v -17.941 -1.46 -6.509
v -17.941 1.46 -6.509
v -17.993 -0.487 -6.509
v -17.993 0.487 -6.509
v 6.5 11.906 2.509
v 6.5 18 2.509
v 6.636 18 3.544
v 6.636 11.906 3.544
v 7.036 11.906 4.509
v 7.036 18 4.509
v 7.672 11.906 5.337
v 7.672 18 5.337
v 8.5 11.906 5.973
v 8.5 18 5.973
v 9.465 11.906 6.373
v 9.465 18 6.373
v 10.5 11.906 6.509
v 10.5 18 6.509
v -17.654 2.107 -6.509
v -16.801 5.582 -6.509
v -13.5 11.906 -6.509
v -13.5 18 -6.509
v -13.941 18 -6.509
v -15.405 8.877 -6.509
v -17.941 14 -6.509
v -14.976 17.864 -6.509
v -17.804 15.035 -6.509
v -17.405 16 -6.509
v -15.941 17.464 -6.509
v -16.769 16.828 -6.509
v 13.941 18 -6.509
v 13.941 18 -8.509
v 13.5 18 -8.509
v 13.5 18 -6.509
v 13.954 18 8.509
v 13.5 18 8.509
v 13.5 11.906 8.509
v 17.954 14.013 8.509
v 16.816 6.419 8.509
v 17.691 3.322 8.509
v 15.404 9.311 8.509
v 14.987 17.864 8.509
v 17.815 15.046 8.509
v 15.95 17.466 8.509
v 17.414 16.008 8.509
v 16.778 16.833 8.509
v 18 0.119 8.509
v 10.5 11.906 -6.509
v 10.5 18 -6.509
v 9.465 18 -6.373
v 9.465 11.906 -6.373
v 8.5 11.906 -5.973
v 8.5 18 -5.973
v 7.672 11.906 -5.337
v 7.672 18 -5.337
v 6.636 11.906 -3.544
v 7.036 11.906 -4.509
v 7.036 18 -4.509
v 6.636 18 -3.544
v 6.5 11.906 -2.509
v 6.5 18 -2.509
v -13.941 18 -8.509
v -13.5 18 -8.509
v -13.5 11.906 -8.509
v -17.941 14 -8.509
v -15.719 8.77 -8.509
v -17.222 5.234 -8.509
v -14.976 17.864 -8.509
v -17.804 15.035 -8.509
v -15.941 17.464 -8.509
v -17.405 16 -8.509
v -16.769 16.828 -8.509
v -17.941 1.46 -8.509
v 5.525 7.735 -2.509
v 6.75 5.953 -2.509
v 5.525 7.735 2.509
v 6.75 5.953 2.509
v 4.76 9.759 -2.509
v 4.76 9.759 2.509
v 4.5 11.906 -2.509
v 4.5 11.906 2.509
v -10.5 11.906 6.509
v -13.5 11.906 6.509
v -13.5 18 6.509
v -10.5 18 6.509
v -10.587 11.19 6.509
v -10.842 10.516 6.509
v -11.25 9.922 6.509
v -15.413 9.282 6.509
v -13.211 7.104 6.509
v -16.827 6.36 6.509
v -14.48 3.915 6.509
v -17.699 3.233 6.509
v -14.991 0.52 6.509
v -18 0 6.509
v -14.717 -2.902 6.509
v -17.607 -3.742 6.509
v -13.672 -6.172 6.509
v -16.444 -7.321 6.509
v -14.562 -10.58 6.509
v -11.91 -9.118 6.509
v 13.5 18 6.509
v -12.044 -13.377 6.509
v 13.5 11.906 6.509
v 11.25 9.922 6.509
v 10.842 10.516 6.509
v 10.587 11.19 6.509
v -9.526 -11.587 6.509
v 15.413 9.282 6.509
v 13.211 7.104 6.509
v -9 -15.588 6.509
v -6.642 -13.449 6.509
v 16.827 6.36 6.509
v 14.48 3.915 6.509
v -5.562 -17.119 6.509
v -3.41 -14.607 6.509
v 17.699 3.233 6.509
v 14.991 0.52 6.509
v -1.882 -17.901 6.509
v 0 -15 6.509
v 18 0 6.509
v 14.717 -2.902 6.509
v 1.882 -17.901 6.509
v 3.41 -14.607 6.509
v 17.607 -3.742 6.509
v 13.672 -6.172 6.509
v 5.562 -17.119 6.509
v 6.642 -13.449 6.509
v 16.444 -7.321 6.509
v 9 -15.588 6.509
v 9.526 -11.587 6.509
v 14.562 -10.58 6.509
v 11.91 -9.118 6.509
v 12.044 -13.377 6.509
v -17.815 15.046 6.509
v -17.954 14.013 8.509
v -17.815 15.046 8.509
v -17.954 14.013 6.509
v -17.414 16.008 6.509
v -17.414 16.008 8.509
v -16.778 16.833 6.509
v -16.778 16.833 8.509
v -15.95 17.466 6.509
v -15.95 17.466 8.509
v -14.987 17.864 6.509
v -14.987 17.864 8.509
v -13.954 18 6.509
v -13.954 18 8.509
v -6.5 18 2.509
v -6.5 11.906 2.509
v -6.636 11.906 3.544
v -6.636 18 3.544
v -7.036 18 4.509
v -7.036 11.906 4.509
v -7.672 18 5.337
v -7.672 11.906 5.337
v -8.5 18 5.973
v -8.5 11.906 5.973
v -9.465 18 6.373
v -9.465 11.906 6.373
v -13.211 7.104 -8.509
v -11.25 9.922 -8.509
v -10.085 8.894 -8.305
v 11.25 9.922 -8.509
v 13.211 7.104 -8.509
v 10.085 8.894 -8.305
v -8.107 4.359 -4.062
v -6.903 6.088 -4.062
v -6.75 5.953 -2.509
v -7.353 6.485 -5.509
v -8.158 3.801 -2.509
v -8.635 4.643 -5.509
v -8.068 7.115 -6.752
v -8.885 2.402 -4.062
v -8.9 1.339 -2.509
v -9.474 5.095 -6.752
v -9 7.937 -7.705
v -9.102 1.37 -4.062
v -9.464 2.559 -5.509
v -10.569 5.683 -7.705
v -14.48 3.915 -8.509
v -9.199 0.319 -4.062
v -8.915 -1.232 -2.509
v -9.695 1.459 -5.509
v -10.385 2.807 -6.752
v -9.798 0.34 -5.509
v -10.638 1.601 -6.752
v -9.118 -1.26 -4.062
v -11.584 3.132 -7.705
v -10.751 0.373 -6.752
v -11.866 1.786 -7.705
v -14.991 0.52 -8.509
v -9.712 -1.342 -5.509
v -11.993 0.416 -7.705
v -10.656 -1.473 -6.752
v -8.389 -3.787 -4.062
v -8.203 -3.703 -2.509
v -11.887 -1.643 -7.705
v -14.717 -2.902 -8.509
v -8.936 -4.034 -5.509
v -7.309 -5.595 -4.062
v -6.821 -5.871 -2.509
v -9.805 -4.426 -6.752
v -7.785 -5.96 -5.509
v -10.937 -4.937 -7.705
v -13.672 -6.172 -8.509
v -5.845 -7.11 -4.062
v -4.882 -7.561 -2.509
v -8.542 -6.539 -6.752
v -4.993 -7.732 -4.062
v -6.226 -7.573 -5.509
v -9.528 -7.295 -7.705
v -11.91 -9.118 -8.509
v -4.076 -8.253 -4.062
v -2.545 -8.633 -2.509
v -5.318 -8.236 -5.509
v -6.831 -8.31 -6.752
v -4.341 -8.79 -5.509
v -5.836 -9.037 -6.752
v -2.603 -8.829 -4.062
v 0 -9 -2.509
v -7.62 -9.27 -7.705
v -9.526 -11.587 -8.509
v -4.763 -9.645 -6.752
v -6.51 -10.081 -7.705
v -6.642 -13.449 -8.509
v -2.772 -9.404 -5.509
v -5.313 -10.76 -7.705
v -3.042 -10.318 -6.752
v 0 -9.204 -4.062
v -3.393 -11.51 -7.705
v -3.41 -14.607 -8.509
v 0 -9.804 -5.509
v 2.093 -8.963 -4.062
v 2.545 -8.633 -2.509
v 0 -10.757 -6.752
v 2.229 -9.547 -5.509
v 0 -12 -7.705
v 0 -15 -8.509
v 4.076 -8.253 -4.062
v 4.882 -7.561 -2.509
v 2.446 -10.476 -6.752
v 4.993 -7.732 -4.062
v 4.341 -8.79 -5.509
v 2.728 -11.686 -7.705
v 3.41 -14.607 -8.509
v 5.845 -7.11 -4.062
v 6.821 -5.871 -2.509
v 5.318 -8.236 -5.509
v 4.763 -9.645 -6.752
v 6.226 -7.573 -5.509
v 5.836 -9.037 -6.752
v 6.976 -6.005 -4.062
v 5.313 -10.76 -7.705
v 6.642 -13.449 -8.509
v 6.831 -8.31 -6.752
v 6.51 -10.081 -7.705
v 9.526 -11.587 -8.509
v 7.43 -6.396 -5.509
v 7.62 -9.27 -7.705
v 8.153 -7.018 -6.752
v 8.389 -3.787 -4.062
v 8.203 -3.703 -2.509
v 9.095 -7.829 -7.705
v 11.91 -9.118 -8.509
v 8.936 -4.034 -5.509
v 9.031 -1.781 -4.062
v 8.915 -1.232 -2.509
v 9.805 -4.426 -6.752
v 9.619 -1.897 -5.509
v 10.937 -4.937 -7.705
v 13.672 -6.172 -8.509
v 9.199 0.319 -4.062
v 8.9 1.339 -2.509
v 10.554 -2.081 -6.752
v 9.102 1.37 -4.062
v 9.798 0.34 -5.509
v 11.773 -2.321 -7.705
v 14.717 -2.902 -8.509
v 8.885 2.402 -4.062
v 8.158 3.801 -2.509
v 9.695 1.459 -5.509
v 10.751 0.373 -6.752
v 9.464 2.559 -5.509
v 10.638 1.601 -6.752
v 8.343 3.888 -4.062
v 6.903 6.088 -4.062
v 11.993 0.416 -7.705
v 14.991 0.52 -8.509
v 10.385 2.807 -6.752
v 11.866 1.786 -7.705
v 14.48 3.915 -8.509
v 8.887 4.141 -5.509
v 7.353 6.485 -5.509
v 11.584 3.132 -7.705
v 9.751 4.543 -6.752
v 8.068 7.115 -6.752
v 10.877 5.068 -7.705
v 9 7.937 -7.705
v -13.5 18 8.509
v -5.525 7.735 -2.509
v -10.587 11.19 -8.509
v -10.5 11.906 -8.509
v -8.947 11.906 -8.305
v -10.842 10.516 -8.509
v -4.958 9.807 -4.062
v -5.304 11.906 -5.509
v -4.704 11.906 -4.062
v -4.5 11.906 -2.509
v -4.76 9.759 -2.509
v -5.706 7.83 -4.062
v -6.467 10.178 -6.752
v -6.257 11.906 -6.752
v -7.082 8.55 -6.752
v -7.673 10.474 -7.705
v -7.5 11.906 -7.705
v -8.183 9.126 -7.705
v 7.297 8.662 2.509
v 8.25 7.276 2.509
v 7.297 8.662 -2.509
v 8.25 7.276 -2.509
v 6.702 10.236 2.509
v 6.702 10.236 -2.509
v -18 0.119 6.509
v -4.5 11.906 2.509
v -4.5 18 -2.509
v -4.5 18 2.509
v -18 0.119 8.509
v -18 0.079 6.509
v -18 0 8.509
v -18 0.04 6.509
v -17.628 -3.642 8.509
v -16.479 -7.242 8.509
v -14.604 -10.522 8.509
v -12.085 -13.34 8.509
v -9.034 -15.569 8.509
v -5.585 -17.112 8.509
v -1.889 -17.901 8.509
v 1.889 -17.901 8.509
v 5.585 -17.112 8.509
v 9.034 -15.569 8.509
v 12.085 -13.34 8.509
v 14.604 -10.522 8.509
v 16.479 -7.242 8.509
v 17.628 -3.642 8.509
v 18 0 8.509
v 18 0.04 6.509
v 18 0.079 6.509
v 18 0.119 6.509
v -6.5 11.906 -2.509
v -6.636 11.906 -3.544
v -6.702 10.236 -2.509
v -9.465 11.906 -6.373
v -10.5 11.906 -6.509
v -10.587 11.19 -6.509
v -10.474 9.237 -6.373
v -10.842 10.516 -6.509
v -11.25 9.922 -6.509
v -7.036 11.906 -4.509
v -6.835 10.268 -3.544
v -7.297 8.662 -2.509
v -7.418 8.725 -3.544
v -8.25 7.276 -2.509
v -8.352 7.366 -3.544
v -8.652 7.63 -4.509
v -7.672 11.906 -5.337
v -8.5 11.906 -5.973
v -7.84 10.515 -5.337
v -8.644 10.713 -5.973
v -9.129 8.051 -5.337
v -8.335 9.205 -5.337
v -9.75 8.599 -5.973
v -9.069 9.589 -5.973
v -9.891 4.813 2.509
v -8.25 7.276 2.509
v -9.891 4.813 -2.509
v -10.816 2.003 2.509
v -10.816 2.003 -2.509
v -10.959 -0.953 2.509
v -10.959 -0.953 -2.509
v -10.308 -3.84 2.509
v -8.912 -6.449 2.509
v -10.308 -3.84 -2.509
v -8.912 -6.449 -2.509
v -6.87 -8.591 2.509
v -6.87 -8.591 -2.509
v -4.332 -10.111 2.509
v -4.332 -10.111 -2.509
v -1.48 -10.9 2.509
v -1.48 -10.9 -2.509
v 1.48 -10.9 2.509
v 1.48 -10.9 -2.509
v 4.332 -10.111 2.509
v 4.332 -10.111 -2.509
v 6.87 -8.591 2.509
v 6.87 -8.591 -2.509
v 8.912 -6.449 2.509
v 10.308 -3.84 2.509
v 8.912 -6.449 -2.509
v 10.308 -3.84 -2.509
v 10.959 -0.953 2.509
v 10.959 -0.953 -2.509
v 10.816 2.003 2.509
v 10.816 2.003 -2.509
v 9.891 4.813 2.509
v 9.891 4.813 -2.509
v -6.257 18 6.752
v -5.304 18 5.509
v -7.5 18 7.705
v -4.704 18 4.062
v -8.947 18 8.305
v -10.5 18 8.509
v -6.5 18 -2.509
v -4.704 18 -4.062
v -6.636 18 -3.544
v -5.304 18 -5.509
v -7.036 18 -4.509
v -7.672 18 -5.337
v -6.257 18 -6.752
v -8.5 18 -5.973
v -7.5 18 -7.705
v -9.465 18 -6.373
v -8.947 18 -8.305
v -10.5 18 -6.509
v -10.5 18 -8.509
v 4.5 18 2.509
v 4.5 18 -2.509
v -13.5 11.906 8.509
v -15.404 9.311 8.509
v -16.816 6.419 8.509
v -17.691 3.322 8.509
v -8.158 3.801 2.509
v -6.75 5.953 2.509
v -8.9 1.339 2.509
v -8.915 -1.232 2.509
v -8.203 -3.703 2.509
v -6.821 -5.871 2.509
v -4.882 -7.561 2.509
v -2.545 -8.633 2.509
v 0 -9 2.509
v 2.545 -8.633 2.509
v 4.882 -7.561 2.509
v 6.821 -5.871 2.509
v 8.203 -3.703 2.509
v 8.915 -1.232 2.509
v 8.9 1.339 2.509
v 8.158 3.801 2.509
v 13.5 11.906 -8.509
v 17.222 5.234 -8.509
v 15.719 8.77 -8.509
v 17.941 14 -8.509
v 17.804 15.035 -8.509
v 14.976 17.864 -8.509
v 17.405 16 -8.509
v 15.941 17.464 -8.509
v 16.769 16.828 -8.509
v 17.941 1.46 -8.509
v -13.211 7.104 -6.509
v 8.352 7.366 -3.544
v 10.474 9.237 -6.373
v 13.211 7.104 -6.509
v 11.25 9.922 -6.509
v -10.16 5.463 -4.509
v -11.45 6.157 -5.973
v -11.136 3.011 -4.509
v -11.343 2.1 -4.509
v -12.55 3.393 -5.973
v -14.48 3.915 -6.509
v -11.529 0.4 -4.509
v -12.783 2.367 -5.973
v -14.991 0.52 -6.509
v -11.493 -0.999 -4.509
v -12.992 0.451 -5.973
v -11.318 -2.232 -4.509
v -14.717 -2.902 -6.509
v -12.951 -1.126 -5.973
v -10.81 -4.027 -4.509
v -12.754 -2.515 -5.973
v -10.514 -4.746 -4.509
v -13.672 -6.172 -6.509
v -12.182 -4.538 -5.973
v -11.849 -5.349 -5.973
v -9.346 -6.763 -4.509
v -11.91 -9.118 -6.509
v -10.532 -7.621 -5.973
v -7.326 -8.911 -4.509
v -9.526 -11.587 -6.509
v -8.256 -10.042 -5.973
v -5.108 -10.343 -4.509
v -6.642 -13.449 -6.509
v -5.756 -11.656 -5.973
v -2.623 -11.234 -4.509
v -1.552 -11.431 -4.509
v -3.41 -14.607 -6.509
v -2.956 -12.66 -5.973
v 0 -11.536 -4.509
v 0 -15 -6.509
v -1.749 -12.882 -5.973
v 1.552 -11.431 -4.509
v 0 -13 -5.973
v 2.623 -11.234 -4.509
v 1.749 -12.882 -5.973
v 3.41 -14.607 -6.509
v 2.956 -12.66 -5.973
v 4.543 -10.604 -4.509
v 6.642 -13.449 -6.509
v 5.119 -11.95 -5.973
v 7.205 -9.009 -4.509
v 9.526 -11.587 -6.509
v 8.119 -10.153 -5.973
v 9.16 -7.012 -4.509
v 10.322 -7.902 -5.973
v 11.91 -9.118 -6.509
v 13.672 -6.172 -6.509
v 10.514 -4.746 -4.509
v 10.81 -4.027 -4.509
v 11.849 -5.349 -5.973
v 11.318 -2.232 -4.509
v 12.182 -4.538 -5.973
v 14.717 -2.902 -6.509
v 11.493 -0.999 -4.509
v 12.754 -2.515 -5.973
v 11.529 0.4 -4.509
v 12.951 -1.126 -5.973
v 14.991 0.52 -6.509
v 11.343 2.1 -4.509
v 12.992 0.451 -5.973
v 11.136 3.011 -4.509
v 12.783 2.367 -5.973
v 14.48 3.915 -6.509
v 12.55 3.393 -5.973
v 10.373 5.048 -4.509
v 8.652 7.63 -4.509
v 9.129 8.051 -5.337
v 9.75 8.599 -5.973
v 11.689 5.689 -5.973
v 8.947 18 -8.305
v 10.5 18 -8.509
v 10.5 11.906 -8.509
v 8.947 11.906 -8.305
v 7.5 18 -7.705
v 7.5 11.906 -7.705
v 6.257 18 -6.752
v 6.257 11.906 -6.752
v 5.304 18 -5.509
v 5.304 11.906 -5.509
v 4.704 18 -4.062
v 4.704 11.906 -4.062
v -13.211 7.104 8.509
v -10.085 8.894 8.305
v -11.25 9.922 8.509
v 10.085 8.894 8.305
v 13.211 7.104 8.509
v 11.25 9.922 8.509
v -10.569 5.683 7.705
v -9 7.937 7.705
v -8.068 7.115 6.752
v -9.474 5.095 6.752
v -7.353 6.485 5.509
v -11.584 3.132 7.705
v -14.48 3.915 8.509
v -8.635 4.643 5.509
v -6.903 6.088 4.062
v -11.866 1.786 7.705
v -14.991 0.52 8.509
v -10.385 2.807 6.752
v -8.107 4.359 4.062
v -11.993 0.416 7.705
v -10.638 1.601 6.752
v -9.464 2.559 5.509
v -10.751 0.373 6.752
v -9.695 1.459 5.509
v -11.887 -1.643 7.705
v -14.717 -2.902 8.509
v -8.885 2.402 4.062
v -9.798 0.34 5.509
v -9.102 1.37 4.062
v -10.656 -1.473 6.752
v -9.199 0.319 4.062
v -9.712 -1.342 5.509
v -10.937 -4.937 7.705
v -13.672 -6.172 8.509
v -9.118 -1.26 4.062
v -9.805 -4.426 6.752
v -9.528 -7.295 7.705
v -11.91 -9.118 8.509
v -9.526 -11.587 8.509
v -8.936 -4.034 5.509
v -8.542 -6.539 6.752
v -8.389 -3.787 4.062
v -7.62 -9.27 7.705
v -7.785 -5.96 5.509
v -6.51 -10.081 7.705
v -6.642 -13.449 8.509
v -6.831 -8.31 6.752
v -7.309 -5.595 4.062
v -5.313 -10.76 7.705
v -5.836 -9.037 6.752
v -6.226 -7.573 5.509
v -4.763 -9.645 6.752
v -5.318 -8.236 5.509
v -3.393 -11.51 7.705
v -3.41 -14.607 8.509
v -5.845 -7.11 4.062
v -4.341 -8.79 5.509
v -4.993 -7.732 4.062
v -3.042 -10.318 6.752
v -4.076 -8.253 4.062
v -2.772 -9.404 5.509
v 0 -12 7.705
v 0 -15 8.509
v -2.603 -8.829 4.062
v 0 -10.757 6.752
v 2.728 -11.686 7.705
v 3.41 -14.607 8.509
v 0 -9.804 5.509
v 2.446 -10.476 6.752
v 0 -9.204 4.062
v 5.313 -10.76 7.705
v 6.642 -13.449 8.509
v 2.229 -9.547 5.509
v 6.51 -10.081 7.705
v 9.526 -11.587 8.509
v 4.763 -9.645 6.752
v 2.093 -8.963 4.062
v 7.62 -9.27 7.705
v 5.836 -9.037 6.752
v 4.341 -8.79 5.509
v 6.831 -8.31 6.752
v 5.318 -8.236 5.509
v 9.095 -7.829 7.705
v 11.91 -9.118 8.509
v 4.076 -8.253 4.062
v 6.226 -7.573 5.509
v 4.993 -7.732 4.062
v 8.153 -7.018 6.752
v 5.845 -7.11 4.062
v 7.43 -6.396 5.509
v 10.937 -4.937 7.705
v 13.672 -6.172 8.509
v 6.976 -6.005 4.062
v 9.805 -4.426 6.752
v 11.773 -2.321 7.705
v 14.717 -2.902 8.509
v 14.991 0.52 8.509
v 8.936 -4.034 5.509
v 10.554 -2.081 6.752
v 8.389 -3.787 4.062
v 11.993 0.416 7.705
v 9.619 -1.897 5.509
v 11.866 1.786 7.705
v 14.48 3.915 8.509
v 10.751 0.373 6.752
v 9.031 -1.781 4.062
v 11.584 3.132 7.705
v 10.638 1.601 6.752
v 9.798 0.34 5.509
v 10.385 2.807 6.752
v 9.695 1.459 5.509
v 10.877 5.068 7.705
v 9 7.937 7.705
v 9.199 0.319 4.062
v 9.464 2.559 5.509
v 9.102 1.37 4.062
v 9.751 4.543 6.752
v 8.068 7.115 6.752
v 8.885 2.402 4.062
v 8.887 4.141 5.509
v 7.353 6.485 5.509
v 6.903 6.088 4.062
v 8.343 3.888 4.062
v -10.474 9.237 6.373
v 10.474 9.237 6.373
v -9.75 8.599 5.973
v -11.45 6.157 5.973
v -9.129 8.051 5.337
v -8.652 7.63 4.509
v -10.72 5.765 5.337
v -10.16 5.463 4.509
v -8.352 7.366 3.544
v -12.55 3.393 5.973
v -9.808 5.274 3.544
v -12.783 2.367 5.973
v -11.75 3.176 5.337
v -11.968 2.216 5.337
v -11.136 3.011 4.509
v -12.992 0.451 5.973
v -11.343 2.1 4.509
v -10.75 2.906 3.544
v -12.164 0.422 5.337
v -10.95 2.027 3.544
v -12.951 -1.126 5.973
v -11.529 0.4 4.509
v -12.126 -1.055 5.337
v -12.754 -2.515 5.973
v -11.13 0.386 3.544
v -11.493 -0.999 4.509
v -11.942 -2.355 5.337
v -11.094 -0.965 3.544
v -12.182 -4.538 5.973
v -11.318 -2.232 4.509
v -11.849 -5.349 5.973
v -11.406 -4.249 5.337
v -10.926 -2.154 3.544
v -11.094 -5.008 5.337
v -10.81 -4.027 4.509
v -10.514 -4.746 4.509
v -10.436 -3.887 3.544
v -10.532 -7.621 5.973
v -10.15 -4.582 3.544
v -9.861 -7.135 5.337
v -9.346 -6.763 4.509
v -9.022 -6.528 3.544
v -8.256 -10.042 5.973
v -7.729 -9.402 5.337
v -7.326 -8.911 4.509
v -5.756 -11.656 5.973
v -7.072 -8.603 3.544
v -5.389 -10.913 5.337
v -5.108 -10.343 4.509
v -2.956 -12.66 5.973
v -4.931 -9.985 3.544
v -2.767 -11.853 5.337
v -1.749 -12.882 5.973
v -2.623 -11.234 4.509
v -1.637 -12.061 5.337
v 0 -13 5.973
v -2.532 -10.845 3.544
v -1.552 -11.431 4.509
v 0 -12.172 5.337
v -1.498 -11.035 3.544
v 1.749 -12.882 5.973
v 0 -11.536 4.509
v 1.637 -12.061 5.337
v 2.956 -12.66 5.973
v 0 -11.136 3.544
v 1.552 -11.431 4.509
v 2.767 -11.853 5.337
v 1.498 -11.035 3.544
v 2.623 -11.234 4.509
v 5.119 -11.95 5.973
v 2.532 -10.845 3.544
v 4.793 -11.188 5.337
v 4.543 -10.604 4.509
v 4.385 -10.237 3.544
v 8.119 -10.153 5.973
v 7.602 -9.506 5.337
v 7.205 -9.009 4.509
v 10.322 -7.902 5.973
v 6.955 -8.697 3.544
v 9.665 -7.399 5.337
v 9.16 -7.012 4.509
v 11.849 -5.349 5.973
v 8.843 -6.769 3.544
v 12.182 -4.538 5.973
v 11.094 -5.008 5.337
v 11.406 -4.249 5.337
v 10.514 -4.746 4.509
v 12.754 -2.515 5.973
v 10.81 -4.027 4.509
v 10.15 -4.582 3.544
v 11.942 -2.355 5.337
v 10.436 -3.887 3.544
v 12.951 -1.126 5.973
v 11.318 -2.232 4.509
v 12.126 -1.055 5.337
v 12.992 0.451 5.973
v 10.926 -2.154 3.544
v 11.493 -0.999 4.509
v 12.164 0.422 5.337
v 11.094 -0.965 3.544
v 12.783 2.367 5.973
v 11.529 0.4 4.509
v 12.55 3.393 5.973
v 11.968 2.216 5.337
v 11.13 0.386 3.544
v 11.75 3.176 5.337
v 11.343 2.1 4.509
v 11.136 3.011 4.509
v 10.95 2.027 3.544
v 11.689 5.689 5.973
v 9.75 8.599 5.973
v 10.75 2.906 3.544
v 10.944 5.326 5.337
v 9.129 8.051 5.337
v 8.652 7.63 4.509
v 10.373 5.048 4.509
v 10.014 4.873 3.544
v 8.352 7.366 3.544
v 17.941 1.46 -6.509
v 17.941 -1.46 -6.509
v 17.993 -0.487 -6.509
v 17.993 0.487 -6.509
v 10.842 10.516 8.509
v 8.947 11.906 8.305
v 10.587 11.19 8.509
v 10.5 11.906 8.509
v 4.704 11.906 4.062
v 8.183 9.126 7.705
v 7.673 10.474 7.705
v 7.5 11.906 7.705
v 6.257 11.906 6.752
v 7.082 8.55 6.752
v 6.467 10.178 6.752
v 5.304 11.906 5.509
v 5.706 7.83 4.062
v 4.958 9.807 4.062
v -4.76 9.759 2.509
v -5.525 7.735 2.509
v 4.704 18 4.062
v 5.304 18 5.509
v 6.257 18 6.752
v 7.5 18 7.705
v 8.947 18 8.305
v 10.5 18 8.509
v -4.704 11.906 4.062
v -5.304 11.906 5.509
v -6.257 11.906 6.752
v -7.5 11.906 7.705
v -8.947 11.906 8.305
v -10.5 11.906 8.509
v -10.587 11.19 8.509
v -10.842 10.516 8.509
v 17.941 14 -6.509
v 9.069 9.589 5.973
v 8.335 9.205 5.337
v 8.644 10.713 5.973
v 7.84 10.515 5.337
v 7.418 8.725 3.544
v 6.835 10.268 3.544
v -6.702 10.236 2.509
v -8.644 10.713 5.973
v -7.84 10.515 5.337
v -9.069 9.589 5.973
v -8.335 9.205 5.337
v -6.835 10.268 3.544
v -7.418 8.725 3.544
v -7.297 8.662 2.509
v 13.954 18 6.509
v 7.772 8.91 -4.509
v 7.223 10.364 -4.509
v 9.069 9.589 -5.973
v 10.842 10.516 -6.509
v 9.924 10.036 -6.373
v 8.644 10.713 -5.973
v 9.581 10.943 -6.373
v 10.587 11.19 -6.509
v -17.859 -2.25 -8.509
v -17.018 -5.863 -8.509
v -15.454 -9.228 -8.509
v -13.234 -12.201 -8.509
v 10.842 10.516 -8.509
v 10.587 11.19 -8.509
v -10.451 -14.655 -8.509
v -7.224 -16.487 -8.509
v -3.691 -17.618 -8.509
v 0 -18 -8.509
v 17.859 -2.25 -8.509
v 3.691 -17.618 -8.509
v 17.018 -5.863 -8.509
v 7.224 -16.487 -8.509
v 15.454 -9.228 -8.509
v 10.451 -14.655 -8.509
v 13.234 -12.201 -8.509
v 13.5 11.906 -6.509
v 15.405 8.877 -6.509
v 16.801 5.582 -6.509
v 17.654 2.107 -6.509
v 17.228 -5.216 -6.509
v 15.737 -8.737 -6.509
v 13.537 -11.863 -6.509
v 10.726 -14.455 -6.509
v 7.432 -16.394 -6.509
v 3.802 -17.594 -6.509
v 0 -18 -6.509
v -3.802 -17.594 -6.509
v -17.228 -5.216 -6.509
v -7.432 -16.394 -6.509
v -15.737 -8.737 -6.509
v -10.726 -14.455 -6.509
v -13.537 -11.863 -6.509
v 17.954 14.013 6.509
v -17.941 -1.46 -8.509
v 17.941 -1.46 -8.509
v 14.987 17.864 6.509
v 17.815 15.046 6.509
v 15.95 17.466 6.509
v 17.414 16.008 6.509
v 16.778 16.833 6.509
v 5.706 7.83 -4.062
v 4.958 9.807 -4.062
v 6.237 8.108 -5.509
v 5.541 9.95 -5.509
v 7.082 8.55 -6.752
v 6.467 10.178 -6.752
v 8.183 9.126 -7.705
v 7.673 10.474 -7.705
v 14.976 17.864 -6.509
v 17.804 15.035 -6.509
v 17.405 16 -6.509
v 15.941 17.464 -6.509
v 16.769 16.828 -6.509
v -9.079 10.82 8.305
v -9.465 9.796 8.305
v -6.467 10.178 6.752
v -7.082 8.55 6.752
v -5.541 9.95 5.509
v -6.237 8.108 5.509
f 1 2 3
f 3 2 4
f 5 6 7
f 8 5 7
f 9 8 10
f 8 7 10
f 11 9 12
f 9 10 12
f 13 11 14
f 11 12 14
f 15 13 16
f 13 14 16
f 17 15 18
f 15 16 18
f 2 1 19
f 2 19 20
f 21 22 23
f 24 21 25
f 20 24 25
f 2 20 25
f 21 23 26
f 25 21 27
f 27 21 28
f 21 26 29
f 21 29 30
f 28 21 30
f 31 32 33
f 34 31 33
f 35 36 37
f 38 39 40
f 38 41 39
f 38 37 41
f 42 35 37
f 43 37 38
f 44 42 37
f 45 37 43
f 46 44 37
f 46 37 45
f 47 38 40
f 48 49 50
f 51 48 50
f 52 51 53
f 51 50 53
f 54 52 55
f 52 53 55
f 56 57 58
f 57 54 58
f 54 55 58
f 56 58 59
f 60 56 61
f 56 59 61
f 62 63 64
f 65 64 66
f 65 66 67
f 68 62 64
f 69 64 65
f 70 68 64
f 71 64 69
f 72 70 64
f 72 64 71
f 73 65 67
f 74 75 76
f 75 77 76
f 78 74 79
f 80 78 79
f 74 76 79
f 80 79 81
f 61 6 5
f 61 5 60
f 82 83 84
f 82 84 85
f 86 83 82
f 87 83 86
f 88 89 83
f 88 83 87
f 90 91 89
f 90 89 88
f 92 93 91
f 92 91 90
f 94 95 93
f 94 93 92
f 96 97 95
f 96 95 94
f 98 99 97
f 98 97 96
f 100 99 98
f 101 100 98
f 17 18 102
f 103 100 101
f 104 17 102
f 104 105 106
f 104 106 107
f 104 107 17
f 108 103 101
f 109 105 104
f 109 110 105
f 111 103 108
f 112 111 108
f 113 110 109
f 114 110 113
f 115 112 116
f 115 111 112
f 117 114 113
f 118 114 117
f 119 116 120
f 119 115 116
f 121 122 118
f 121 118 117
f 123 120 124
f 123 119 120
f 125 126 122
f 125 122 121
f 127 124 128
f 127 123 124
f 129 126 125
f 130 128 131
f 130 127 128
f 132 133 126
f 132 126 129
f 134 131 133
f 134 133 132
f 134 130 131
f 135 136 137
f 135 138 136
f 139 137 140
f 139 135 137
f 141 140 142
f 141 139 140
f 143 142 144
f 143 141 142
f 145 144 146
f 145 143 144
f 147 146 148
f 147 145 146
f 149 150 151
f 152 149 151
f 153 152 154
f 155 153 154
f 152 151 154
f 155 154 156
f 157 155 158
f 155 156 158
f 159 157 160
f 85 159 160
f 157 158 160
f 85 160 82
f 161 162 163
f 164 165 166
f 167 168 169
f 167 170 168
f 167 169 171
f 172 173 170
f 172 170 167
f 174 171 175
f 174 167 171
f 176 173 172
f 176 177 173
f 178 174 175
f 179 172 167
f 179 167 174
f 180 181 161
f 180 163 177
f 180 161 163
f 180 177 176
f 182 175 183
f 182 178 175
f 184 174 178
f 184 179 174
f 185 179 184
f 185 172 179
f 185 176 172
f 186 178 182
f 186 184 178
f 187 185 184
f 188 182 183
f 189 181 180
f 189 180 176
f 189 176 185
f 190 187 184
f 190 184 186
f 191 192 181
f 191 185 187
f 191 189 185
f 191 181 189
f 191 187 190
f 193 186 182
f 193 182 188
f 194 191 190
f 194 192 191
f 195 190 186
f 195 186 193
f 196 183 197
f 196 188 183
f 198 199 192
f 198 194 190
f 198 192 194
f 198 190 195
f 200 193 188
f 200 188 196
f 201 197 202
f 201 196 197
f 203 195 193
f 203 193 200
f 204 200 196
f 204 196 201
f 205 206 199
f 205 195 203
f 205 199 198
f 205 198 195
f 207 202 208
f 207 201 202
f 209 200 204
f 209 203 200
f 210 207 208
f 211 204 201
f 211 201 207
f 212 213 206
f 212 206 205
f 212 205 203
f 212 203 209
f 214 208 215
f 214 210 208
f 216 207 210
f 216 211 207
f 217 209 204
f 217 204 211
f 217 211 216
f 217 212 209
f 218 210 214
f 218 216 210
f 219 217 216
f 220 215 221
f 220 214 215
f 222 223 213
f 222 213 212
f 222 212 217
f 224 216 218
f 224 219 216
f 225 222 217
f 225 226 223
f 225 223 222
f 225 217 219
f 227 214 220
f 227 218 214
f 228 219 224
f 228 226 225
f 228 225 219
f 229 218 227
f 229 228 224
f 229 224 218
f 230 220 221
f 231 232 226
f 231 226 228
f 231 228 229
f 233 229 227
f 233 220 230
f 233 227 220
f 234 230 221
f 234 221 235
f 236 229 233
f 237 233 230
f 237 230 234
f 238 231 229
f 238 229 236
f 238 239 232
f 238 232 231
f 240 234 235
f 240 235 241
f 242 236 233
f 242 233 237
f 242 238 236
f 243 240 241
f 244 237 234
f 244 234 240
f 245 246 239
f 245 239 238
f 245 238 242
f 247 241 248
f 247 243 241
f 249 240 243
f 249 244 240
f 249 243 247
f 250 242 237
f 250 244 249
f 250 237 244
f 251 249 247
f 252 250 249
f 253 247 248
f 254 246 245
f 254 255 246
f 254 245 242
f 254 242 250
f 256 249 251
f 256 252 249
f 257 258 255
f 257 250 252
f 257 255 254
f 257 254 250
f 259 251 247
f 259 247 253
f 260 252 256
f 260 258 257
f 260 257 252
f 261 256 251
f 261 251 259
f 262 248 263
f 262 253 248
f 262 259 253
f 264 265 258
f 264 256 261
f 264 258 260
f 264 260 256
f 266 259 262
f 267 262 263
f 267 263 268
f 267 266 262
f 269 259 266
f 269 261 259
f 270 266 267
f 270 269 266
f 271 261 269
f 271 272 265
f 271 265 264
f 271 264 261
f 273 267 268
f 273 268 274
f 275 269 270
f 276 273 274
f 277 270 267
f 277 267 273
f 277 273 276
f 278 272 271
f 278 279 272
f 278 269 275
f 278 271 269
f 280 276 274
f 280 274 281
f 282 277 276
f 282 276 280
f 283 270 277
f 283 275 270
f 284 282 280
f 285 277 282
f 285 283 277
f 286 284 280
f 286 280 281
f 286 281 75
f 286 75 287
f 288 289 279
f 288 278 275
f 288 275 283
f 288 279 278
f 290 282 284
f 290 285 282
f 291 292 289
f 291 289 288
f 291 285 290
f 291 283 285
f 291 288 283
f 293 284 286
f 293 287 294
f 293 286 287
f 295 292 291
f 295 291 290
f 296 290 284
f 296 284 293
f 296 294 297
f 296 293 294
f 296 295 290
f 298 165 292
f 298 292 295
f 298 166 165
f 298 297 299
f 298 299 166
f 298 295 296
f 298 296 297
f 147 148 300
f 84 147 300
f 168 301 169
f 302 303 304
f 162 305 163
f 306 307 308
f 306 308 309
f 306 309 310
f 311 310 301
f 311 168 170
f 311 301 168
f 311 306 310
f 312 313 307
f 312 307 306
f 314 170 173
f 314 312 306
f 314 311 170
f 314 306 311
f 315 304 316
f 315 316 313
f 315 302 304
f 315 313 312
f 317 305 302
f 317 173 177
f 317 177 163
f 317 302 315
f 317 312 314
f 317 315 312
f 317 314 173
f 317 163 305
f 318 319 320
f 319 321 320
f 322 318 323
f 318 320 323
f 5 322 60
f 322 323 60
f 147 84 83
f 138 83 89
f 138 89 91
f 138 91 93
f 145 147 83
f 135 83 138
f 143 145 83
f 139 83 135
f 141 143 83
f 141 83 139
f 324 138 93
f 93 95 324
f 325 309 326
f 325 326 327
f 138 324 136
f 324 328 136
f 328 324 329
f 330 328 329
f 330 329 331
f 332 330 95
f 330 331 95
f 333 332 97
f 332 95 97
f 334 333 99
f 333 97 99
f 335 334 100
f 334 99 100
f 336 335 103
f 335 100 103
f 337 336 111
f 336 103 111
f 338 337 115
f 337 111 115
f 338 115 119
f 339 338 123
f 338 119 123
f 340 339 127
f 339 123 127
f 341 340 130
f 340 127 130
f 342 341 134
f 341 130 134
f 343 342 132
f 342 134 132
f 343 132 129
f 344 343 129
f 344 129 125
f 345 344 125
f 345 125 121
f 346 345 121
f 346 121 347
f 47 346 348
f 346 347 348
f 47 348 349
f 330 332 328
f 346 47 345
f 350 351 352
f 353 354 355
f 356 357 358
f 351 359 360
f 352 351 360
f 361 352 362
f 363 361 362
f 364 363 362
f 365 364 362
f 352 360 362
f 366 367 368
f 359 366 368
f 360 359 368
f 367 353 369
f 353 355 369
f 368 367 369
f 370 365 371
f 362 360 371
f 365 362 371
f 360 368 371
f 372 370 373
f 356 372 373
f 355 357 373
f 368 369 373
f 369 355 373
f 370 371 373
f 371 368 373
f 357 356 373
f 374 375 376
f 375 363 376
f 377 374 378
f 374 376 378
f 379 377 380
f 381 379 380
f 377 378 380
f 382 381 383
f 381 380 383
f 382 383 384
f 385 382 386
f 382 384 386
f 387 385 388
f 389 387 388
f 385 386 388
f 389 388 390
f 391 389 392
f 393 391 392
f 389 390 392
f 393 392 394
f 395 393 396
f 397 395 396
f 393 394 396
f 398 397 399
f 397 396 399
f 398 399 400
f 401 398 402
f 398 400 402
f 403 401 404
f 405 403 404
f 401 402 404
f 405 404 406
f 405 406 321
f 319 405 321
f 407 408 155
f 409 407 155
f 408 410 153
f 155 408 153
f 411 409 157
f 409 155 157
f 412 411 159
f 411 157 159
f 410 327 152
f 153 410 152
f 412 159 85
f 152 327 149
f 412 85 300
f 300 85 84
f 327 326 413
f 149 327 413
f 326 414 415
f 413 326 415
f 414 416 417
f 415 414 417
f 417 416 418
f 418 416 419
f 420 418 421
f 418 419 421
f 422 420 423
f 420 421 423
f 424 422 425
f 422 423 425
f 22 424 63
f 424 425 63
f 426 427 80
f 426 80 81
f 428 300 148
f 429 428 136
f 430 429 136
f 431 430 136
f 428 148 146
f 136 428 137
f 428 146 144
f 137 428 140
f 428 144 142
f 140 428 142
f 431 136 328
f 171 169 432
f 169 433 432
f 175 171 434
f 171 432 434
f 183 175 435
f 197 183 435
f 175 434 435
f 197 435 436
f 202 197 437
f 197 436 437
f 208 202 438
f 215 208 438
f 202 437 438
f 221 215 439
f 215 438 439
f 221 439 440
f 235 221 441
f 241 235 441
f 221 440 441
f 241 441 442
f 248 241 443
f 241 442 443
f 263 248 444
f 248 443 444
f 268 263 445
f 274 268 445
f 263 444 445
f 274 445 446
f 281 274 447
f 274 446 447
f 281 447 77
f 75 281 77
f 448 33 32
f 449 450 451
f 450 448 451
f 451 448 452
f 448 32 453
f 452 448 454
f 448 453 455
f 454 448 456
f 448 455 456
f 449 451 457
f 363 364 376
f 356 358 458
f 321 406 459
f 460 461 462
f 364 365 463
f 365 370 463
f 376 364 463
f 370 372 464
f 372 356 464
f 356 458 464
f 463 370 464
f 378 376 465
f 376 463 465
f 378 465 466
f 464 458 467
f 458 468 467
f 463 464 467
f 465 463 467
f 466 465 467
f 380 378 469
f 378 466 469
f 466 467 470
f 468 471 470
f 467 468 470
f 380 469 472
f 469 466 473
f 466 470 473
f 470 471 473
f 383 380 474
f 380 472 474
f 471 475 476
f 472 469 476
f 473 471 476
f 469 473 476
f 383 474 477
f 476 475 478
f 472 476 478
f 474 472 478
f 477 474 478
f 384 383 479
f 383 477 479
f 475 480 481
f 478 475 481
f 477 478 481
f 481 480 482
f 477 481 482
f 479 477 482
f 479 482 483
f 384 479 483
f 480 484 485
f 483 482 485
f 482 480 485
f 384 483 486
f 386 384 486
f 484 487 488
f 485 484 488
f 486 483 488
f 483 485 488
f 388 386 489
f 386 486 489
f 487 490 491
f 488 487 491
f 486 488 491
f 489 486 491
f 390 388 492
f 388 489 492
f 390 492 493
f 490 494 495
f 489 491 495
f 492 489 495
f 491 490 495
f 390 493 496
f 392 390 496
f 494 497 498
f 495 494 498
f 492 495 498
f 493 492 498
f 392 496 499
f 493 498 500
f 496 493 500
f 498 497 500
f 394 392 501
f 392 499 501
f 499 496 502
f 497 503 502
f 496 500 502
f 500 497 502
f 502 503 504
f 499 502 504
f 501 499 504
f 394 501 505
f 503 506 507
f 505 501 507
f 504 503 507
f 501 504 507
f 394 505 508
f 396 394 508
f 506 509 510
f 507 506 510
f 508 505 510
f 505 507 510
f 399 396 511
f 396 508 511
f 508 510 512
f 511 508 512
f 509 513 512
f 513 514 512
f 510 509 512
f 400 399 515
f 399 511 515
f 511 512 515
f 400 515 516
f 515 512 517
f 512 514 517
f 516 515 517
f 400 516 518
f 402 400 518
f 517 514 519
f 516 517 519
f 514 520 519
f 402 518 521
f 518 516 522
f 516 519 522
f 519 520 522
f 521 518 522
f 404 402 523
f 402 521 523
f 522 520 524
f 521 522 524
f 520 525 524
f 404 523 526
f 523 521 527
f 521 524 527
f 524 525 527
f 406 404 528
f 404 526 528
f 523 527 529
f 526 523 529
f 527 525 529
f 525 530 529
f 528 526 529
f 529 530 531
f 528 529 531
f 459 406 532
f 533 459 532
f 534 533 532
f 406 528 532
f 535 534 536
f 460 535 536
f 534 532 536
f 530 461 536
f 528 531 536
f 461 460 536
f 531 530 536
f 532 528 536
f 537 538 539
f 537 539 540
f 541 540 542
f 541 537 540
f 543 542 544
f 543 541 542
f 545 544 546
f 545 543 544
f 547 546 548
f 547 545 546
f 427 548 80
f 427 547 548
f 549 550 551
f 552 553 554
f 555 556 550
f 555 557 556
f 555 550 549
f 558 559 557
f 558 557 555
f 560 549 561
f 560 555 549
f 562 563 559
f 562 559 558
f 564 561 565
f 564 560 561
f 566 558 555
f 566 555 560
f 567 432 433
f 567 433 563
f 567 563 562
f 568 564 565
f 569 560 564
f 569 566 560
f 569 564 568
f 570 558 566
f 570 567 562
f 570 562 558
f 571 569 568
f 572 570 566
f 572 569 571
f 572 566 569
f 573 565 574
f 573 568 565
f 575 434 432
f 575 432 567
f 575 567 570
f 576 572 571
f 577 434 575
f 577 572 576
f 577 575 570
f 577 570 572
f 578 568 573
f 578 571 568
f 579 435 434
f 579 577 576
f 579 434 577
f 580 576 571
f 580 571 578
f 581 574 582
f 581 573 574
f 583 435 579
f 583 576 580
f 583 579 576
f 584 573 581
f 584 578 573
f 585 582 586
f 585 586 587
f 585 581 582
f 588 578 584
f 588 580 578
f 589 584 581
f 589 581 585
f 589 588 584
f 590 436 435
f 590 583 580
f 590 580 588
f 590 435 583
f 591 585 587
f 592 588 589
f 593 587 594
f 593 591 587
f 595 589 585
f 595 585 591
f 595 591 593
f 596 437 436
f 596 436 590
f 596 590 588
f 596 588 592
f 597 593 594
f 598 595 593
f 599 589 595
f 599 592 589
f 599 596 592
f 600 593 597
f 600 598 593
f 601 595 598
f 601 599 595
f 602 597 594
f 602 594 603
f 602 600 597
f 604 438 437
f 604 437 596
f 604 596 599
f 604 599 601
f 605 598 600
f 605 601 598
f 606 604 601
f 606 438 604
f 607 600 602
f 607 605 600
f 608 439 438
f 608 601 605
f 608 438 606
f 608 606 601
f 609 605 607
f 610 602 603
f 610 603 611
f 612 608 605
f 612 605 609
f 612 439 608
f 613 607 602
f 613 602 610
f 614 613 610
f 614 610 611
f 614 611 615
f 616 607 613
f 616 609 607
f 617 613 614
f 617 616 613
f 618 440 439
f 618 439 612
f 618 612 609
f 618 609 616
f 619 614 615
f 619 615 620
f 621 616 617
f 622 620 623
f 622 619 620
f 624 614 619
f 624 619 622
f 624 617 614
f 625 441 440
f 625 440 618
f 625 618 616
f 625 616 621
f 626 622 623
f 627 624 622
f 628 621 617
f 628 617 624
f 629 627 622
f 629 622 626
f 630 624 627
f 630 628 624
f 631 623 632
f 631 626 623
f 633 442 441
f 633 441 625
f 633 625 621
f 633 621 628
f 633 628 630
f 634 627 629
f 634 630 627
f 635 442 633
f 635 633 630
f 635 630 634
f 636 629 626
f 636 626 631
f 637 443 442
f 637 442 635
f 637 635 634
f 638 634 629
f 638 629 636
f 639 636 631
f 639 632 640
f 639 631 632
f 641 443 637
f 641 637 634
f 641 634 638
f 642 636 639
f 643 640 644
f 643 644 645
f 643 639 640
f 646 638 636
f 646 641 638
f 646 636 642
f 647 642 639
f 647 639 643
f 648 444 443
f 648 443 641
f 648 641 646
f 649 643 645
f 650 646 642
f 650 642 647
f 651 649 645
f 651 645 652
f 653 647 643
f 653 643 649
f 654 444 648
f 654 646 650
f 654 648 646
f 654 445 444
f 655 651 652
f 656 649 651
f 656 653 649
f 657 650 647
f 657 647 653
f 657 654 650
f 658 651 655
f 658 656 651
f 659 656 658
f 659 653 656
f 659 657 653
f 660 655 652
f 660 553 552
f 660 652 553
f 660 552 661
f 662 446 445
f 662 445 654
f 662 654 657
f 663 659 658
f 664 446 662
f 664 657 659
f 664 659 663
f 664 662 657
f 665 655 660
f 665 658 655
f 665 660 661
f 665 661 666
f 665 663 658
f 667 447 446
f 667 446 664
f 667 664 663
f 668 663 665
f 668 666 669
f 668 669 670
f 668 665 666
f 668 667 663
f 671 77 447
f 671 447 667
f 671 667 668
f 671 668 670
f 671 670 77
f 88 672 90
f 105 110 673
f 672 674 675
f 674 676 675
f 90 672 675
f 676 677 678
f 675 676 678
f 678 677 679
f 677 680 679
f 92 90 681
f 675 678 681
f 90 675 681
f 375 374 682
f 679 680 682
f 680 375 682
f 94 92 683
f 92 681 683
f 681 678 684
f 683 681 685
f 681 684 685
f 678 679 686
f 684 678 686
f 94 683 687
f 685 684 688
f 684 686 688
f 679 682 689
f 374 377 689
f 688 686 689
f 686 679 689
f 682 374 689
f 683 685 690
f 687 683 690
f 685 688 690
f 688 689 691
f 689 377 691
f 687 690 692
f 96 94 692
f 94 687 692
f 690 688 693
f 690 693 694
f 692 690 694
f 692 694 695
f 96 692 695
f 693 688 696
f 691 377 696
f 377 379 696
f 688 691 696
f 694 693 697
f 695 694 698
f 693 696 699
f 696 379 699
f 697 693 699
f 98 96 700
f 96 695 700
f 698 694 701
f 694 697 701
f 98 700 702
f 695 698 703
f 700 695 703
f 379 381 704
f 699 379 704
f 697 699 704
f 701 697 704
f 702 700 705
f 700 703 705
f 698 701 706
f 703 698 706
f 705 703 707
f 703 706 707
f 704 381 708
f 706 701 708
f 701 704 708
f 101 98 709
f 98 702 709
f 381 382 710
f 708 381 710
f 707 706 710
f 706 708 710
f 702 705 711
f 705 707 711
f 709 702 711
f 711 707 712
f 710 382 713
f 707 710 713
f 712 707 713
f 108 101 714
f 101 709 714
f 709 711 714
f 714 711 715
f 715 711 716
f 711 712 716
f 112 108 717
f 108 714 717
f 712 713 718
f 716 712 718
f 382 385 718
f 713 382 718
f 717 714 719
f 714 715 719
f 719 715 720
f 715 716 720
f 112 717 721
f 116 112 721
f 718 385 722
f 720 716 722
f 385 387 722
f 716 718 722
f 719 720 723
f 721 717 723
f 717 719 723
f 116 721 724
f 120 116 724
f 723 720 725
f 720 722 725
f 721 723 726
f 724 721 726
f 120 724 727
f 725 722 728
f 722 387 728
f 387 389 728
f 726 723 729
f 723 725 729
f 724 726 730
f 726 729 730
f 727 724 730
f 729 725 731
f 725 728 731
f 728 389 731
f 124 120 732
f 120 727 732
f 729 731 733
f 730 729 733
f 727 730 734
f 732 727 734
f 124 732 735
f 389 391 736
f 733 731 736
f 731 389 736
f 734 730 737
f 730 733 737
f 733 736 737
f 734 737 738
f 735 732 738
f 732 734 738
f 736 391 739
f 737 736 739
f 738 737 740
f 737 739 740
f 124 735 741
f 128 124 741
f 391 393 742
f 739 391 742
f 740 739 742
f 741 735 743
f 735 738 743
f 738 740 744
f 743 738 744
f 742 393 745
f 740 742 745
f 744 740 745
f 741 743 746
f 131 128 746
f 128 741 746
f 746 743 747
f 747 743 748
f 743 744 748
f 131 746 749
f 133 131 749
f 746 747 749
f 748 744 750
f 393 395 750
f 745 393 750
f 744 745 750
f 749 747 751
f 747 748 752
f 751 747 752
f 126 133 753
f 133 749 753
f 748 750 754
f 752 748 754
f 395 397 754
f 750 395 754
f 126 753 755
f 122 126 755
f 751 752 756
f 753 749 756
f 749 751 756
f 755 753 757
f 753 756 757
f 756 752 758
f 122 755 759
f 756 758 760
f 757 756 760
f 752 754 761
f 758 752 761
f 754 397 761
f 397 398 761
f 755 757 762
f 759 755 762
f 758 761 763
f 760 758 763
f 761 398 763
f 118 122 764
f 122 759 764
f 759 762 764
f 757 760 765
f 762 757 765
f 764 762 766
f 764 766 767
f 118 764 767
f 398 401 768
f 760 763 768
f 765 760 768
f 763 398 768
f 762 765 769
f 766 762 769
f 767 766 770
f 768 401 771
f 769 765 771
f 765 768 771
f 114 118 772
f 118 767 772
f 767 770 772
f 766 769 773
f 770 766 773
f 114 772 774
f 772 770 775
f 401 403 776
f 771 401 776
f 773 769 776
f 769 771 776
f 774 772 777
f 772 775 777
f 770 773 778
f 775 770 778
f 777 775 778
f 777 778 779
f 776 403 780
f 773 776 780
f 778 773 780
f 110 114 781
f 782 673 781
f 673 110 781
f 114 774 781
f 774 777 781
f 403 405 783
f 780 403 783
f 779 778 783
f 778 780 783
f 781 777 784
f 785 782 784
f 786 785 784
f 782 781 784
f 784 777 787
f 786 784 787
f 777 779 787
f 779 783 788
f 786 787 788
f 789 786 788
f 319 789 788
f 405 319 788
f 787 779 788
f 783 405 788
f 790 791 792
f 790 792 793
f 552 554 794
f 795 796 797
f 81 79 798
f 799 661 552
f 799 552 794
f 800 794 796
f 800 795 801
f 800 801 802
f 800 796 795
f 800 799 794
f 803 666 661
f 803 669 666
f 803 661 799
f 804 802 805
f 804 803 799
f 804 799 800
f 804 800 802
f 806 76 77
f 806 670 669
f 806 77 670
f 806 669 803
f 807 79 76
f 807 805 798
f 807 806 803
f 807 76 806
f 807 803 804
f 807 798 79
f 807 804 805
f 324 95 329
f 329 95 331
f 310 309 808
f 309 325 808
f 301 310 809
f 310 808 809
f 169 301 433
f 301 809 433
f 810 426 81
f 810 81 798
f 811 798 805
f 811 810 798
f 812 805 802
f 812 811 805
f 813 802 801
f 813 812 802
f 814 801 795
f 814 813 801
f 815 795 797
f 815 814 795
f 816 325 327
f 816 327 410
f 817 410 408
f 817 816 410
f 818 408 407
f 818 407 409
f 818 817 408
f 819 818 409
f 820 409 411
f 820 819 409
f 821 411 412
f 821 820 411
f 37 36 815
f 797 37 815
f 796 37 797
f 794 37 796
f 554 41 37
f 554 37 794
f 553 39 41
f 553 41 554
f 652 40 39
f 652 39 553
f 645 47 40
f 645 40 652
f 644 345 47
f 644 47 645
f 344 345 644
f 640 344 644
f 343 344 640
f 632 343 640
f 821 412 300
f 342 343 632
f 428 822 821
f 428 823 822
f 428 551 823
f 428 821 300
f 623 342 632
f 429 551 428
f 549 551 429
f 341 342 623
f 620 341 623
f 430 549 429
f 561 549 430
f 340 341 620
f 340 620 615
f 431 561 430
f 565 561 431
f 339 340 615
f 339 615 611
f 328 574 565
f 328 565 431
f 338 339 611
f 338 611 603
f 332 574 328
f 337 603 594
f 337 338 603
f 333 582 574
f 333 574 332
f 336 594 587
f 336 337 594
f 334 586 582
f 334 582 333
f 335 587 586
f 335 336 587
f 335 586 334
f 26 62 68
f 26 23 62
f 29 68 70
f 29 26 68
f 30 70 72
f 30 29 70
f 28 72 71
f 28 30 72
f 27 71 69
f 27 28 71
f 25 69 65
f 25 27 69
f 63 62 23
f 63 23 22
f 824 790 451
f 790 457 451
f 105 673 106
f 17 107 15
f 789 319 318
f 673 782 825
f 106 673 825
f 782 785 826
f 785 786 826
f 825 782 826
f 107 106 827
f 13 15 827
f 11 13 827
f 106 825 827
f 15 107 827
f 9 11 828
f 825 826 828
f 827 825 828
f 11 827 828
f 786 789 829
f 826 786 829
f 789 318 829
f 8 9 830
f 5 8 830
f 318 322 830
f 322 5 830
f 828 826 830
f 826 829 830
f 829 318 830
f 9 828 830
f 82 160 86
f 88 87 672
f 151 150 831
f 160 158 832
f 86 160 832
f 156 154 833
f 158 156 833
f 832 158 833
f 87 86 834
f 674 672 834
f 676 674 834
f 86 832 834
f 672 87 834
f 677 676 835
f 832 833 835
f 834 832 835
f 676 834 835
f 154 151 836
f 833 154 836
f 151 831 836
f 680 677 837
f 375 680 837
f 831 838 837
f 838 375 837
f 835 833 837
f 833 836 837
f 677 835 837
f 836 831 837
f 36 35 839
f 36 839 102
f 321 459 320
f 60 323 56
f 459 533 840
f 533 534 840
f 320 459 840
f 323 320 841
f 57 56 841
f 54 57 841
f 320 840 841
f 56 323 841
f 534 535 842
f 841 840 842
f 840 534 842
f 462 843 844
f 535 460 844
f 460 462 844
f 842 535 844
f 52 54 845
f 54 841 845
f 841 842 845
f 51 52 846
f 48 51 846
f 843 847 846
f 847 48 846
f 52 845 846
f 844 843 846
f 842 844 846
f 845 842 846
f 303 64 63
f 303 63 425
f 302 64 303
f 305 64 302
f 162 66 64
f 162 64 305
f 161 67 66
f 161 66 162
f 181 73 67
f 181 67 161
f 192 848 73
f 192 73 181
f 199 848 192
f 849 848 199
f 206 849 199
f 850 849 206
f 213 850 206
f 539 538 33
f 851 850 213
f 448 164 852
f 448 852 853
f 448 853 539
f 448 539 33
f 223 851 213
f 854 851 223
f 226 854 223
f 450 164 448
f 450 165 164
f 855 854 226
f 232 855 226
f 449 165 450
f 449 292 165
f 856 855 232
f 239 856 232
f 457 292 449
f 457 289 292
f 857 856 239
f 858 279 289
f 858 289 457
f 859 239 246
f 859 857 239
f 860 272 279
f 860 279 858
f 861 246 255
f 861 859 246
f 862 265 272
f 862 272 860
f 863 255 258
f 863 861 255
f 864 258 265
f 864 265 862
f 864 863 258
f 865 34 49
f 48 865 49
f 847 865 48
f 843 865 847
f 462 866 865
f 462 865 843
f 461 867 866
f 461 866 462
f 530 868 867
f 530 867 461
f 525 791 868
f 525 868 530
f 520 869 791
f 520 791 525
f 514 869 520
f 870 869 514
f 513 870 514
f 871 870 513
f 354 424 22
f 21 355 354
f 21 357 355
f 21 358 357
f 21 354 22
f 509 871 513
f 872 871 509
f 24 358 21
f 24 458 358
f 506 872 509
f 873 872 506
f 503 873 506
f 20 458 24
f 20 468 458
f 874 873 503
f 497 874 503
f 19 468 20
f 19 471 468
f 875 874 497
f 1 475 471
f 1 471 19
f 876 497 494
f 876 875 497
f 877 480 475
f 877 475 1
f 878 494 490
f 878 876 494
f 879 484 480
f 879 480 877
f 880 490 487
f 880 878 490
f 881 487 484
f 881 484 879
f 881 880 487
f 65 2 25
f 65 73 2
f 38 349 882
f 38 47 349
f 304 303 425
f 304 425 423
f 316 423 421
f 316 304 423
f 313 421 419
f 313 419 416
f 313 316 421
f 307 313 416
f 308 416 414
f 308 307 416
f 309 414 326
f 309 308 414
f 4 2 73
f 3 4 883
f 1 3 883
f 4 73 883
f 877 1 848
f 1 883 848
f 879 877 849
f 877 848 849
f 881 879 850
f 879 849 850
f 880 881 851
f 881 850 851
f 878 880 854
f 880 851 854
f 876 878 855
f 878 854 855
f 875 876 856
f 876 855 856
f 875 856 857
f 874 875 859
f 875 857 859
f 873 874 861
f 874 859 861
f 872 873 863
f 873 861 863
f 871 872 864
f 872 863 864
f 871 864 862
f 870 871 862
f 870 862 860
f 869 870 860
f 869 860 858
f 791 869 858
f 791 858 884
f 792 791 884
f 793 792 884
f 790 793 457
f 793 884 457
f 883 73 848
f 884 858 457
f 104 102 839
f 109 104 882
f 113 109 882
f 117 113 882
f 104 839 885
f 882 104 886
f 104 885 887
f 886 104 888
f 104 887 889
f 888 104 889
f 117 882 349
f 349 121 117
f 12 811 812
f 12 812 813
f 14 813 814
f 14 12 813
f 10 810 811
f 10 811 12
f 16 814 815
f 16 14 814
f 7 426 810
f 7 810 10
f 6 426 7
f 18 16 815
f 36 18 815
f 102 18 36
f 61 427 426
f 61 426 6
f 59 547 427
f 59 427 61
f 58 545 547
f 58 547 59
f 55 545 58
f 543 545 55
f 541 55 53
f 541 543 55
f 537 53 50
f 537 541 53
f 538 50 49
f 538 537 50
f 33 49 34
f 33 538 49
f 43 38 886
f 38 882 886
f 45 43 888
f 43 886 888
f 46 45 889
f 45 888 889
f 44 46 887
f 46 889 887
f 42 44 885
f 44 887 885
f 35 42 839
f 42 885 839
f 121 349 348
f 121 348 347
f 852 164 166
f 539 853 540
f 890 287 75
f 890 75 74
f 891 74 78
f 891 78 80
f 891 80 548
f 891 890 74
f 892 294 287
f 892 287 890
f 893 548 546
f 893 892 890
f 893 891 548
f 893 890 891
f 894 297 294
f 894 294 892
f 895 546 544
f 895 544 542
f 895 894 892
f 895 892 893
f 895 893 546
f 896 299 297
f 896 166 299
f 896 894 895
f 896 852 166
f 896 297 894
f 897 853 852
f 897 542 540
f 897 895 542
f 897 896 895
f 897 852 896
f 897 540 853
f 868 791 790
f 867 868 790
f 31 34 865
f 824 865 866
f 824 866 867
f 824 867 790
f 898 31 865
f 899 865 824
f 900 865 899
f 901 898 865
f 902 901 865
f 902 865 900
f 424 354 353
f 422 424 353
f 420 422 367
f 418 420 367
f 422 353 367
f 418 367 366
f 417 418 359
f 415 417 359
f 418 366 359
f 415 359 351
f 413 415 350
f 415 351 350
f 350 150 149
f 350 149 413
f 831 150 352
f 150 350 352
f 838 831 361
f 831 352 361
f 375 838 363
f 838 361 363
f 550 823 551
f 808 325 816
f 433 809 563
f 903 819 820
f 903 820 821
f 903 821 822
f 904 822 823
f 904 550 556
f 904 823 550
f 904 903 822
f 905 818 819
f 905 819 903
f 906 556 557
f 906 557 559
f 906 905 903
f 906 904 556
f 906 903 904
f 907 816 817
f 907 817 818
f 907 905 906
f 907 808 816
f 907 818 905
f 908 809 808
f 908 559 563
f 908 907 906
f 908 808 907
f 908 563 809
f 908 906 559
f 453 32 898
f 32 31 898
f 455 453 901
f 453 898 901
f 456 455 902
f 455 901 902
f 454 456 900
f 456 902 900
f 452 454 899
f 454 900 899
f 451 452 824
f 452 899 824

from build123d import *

# Parameters (mm, degrees)
BOSS_EXTRUDE1_START = -8.508956
BOSS_EXTRUDE1_DEPTH = 2
BOSS_EXTRUDE2_START = 8.508956
BOSS_EXTRUDE2_DEPTH = 2
FILLET1_R           = 4


with BuildPart() as part:
    # Sweep2: sweep along a path in Sketch2
    with BuildLine(Plane.XY) as sweep2_path:
        Line((-4.5, 18), (-4.5, 11.9058809))
        ThreePointArc((-4.5, 11.9058809), (-5.08127088, 8.723900384), (-6.75, 5.95294045))
        ThreePointArc((-6.75, 5.95294045), (0, -9), (6.75, 5.95294045))
        ThreePointArc((6.75, 5.95294045), (5.08127088, 8.723900384), (4.5, 11.9058809))
        Line((4.5, 11.9058809), (4.5, 18))
    # Sketch5 → Sweep2 (sweep)
    with BuildSketch(Plane(origin=(0, 0, 0), x_dir=(0, 0, -1), z_dir=(1, 0, 0))):
        with BuildLine():
            Line((-2.508956399, -9), (2.508956399, -9))
            ThreePointArc((2.508956399, -9), (6.751597087, -10.757359313), (8.508956399, -15))
            Line((8.508956399, -15), (8.508956399, -18))
            Line((8.508956399, -18), (6.508956399, -18))
            Line((6.508956399, -18), (6.508956399, -15))
            ThreePointArc((6.508956399, -15), (5.337383524, -12.171572875), (2.508956399, -11))
            Line((2.508956399, -11), (-2.508956399, -11))
            ThreePointArc((-2.508956399, -11), (-5.337383524, -12.171572875), (-6.508956399, -15))
            Line((-6.508956399, -15), (-6.508956399, -18))
            Line((-6.508956399, -18), (-8.508956399, -18))
            Line((-8.508956399, -18), (-8.508956399, -15))
            ThreePointArc((-8.508956399, -15), (-6.751597087, -10.757359313), (-2.508956399, -9))
        make_face()
    sweep(path=sweep2_path.line)

    # Sketch7 → Boss-Extrude1 (add)
    with BuildSketch(Plane.XY.offset(BOSS_EXTRUDE1_START)):
        with BuildLine():
            Line((17.940697807, -1.45991856), (17.940697807, 18))
            Line((17.940697807, 18), (13.5, 18))
            Line((13.5, 18), (13.5, 11.9058809))
            ThreePointArc((13.5, 11.9058809), (16.801469128, 5.58217616), (17.940697807, -1.45991856))
        make_face()
        with BuildLine():
            Line((-13.5, 18), (-13.5, 11.9058809))
            ThreePointArc((-13.5, 11.9058809), (-16.801469128, 5.58217616), (-17.940697807, -1.45991856))
            Line((-17.940697807, -1.45991856), (-17.940697807, 18))
            Line((-17.940697807, 18), (-13.5, 18))
        make_face()
    extrude(amount=BOSS_EXTRUDE1_DEPTH)

    # Sketch9 → Boss-Extrude2 (add)
    with BuildSketch(Plane.XY.offset(BOSS_EXTRUDE2_START)):
        with BuildLine():
            Line((18, 0), (17.940697807, 18))
            Line((17.940697807, 18), (13.5, 18))
            Line((13.5, 18), (13.5, 11.9058809))
            ThreePointArc((13.5, 11.9058809), (16.827327901, 6.360132122), (18, 0))
        make_face()
        with BuildLine():
            Line((-13.5, 18), (-13.5, 11.9058809))
            ThreePointArc((-13.5, 11.9058809), (-16.827327901, 6.360132122), (-18, 0))
            Line((-18, 0), (-17.940697807, 18))
            Line((-17.940697807, 18), (-13.5, 18))
        make_face()
    extrude(amount=-BOSS_EXTRUDE2_DEPTH)

    # Fillet1
    fillet1_edges = [part.edges().sort_by_distance(p)[0] for p in [
        (17.940697807, 18, 7.508956),
        (17.940697807, 18, -7.508956),
        (-17.940697807, 18, 7.508956),
        (-17.940697807, 18, -7.508956),
    ]]
    fillet(fillet1_edges, radius=FILLET1_R)


solid = part.part
